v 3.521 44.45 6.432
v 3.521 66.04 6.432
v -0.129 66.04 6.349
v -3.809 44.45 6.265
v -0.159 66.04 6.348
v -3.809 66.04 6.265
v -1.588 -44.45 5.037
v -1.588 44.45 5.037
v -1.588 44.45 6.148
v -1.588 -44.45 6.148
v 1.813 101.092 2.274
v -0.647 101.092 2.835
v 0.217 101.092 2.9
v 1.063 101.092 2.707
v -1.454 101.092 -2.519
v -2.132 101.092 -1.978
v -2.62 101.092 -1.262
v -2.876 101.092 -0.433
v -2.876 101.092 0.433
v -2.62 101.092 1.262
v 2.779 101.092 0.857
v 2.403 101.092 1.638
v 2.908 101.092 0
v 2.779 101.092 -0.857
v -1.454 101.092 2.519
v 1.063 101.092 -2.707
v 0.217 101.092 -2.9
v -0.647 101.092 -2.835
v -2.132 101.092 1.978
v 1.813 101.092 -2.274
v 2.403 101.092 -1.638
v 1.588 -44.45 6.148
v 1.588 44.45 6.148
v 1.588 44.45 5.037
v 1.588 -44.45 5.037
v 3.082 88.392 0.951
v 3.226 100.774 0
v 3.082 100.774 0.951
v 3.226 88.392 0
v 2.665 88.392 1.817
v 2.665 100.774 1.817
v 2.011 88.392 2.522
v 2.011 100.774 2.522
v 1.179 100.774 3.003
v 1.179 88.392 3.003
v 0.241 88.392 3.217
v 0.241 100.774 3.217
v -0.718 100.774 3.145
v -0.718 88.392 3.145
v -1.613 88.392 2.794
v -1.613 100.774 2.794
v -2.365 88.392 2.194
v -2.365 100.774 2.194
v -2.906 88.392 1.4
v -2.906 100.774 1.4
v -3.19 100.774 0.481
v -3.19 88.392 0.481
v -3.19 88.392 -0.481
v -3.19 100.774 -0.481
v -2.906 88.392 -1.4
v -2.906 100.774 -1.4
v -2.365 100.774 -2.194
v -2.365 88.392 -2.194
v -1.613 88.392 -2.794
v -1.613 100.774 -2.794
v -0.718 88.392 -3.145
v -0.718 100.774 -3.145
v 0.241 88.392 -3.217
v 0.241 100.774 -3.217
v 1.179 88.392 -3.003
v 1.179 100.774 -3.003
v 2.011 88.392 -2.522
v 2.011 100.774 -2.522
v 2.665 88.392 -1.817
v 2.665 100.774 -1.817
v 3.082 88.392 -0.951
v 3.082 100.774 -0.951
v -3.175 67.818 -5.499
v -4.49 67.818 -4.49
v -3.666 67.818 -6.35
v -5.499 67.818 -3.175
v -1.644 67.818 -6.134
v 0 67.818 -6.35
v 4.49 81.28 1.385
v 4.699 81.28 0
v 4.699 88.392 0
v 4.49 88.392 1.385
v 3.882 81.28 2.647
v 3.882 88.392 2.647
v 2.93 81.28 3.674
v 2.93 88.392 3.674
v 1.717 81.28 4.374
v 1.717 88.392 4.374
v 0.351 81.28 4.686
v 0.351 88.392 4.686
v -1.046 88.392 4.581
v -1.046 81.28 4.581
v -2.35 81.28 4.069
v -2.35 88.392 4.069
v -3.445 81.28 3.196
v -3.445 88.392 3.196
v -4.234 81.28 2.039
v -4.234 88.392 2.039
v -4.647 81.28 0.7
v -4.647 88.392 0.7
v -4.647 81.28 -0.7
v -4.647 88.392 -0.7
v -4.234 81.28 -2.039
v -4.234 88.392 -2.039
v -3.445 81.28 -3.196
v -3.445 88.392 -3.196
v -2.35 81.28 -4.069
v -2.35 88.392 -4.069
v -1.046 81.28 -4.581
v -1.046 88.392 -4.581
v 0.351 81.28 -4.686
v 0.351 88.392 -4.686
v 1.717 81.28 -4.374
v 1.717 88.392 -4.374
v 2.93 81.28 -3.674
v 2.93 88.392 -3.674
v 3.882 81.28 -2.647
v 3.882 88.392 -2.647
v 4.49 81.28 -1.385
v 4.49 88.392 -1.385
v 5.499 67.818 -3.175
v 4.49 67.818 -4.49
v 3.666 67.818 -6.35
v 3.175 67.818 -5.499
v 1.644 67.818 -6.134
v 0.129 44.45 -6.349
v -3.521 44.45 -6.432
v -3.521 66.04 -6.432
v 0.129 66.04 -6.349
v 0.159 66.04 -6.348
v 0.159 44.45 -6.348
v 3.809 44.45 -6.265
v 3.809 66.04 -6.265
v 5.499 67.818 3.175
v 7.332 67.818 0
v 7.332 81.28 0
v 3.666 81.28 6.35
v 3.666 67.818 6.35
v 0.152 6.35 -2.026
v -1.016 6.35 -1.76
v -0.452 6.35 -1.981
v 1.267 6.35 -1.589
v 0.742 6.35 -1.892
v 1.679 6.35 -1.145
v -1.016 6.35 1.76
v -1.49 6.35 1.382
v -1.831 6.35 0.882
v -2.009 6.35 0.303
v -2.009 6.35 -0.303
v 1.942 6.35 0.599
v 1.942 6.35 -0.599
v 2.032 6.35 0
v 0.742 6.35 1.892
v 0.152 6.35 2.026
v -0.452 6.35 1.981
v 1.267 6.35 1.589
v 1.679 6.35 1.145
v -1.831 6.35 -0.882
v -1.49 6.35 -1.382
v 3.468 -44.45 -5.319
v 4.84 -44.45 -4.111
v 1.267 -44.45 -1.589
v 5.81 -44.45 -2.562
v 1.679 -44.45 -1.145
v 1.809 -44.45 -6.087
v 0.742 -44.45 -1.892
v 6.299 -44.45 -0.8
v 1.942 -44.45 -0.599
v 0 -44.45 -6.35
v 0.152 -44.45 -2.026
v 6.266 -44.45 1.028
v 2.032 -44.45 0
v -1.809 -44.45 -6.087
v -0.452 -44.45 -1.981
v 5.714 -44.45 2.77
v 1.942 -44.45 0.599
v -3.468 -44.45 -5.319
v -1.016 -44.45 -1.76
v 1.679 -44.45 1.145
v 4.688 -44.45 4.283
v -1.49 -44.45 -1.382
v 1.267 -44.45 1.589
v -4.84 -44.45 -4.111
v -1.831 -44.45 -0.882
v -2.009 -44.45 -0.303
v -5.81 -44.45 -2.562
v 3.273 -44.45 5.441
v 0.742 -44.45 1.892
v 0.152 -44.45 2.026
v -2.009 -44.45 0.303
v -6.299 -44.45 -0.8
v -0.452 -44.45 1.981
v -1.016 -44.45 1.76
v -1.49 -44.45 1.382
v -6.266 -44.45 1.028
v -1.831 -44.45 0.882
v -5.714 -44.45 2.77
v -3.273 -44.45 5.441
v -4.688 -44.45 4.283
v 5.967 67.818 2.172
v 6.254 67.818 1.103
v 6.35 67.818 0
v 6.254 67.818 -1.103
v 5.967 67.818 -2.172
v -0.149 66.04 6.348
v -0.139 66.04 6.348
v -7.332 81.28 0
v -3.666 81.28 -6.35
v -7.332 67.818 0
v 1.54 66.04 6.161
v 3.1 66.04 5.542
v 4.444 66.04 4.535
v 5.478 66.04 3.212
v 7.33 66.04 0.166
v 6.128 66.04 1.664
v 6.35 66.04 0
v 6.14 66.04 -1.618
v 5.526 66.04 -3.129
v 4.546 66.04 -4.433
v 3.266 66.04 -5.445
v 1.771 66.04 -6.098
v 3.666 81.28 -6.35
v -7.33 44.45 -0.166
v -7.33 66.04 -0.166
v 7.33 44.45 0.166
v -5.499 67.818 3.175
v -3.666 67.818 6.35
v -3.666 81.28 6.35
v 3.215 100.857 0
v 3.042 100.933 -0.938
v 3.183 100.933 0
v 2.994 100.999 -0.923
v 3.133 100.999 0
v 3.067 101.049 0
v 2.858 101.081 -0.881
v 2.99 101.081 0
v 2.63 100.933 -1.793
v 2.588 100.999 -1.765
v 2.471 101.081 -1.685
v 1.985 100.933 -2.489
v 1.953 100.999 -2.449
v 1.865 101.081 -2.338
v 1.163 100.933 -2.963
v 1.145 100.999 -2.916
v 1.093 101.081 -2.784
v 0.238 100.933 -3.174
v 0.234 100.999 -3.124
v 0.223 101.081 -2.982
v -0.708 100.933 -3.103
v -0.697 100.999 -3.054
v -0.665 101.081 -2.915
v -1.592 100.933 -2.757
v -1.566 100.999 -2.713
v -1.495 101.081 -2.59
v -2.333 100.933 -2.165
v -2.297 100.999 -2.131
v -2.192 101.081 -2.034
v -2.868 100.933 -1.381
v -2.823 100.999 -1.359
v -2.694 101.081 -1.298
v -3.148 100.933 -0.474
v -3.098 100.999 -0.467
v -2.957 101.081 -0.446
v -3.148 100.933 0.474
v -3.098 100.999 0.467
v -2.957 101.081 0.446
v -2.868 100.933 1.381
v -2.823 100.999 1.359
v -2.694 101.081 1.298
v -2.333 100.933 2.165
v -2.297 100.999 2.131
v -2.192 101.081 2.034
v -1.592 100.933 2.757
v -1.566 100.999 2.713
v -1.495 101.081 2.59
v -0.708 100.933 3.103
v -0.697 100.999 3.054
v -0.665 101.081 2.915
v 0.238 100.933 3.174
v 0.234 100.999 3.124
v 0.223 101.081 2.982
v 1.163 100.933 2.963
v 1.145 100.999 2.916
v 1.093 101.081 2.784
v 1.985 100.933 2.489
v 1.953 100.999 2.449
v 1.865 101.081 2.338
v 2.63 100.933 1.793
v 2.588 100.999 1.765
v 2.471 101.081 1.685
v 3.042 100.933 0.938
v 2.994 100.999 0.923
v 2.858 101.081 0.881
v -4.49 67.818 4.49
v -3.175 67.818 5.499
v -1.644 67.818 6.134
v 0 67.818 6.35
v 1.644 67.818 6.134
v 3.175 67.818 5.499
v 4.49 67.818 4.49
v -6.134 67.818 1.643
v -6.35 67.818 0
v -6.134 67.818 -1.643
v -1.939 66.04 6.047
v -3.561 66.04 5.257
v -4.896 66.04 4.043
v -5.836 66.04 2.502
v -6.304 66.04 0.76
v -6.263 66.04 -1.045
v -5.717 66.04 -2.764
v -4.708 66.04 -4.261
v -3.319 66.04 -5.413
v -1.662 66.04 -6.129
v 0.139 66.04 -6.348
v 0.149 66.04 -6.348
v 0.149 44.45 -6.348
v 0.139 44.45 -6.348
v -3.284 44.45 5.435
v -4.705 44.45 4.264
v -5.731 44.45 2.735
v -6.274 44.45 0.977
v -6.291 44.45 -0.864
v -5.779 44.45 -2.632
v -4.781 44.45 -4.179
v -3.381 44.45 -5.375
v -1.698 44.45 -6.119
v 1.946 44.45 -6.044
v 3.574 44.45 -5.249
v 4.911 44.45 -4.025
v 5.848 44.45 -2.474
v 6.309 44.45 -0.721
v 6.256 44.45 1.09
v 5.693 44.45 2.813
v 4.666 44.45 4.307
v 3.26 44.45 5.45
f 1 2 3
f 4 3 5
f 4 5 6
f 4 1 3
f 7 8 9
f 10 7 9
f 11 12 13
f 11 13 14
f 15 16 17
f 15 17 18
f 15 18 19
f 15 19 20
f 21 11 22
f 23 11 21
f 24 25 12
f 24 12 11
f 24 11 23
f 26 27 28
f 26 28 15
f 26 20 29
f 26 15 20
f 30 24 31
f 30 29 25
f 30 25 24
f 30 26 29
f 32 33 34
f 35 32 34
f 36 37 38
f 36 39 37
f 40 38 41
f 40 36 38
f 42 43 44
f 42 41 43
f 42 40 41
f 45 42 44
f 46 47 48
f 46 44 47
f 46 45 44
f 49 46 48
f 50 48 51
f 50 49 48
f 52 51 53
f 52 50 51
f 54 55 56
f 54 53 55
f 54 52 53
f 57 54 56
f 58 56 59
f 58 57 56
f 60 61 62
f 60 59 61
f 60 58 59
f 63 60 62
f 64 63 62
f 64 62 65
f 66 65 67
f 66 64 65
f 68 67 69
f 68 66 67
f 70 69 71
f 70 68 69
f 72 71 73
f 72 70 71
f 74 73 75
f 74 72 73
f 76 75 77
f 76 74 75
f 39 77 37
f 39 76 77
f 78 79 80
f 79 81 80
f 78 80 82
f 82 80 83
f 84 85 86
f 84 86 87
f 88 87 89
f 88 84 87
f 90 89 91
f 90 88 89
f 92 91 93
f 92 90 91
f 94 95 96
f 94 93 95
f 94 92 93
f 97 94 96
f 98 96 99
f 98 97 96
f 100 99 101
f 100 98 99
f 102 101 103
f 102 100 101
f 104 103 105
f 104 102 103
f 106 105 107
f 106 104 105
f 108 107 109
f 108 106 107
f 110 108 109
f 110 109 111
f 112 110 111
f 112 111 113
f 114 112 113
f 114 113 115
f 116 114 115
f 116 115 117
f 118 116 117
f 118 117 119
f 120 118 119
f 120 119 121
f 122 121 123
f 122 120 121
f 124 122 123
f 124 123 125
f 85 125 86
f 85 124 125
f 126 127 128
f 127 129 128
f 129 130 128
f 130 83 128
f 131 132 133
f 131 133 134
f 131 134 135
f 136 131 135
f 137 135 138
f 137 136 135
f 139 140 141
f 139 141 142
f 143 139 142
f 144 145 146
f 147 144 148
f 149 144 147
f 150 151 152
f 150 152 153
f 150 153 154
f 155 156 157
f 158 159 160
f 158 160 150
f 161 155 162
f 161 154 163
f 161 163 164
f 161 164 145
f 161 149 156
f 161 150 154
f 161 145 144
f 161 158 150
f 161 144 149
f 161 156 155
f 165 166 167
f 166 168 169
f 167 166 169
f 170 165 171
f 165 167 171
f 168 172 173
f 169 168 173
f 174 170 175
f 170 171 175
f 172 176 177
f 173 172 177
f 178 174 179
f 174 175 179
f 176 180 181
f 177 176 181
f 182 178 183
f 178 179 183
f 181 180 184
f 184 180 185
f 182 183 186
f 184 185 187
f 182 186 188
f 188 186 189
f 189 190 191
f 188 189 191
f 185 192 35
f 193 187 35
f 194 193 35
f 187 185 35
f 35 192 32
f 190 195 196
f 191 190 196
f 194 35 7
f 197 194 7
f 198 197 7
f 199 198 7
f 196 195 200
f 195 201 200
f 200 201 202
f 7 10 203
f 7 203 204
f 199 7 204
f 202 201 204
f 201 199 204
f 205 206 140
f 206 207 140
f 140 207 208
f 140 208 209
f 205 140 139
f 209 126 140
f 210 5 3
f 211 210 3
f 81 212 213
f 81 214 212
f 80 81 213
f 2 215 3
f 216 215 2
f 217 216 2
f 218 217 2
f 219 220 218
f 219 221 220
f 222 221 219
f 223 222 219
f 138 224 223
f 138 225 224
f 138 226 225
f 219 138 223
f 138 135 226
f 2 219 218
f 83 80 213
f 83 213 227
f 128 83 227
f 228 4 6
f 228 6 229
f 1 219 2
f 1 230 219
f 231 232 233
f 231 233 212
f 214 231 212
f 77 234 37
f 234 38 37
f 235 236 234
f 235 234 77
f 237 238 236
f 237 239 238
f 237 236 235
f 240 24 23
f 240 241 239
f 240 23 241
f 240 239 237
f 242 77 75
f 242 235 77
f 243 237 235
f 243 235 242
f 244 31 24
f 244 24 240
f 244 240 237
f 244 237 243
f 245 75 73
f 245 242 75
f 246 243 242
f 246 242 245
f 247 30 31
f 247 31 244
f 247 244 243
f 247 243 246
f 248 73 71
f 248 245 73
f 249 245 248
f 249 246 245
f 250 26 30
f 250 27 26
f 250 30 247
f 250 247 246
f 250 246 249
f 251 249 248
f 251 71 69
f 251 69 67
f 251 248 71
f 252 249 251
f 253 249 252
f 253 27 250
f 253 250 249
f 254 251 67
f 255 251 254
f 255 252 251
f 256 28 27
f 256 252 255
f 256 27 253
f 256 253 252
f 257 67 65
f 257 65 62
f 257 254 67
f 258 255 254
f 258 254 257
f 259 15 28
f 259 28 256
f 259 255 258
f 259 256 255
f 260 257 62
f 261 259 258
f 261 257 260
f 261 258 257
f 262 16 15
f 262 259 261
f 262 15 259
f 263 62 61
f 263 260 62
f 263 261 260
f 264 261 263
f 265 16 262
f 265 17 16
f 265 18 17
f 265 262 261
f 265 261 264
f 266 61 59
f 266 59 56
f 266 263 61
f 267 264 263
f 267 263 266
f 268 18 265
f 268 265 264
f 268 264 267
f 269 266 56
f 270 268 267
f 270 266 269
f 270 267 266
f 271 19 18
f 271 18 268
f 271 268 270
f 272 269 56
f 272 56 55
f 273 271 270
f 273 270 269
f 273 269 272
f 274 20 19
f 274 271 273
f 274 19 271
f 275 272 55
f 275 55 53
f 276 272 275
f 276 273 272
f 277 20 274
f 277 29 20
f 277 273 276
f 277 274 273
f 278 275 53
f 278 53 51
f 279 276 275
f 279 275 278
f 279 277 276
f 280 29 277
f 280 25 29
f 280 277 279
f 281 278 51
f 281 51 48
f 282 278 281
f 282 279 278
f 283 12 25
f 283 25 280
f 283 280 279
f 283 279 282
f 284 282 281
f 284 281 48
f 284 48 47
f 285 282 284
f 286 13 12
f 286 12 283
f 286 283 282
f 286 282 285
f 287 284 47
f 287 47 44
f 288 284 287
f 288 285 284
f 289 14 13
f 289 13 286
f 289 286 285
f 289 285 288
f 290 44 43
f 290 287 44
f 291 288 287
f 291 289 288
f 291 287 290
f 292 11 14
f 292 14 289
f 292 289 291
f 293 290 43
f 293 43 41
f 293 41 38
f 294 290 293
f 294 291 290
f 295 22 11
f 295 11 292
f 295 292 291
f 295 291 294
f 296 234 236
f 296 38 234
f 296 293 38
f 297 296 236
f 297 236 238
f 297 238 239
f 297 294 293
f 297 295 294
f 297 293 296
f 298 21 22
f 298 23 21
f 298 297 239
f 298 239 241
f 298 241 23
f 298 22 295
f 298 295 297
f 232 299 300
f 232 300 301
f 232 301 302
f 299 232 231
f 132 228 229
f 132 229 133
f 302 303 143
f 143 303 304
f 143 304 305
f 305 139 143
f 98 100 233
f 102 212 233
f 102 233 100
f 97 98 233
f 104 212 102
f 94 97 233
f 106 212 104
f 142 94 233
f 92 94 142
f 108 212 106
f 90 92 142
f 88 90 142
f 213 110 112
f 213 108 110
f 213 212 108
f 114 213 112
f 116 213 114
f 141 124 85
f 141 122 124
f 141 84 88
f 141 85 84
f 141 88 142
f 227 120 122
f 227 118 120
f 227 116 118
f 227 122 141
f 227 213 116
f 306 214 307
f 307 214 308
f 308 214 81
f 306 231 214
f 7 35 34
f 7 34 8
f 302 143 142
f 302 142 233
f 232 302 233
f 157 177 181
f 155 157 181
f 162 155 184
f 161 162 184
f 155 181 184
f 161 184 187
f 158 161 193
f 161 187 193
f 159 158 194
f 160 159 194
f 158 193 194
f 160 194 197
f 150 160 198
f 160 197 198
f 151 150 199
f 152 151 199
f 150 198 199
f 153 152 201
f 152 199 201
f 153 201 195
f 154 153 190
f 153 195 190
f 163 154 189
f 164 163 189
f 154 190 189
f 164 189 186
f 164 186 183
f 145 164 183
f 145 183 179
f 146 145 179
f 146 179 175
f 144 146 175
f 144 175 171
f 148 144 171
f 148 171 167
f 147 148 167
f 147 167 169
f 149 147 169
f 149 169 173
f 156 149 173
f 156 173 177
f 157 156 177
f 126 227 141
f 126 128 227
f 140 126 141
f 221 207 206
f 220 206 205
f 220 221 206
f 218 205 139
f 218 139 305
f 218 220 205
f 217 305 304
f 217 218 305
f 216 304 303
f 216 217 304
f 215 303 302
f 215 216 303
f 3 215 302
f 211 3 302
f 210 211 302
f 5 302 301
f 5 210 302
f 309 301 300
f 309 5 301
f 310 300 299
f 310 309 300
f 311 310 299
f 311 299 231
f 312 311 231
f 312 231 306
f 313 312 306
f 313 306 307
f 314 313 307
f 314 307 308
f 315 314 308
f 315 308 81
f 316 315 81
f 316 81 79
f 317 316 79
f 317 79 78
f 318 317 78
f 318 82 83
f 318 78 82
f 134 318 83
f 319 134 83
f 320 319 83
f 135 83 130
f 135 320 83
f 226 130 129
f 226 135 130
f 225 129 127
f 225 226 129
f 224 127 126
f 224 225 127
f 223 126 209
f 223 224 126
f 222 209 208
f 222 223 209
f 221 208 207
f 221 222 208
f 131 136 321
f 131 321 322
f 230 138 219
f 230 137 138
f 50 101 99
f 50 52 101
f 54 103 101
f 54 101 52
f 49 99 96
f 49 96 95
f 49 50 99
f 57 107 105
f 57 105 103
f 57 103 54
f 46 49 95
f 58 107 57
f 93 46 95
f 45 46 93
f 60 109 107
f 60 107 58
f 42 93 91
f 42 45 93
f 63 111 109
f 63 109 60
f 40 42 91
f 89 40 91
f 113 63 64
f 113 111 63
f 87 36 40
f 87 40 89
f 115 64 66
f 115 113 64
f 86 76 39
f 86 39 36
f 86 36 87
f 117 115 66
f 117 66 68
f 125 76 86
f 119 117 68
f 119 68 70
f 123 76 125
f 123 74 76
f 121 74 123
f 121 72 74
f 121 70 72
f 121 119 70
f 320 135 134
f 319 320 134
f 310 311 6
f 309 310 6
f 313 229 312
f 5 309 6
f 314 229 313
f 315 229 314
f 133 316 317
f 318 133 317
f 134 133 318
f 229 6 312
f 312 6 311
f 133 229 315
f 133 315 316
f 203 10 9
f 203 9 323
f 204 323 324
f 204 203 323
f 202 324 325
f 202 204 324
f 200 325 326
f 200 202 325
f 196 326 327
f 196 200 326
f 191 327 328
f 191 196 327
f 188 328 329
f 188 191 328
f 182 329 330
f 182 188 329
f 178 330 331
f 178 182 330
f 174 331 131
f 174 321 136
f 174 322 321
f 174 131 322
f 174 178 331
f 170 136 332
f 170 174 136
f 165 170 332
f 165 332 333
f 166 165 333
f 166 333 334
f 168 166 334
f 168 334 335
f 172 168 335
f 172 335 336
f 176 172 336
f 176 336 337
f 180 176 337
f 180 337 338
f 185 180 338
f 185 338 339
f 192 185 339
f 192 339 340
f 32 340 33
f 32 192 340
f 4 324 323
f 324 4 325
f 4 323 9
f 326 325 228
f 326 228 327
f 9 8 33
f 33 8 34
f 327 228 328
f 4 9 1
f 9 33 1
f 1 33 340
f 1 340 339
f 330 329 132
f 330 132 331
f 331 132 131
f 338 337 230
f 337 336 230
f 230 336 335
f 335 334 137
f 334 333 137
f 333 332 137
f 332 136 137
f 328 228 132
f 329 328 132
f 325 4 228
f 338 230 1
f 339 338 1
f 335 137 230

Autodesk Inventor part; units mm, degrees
ref_plane "YZ Plane" through (0, 0, 0) normal (1, 0, 0) x (0, 1, 0)
ref_plane "XZ Plane" through (0, 0, 0) normal (0, 1, 0) x (-1, 0, 0)
ref_plane "XY Plane" through (0, 0, 0) normal (0, 0, 1) x (1, 0, 0)
sketch "Sketch1" plane through (0, 0, 0) normal (0, 1, 0) x (-1, 0, 0)
  circle A0 centre (0, 0) radius 6.35
  dimension "d0" = 12.7
extrude "Extrusion1" add sketch "Sketch1" along normal mid plane 88.9
sketch "Sketch2" plane through (0, 44.45, 0) normal (0, 1, 0) x (1, 0, 0)
  circle A0 centre (0, 0) radius 6.35 projected
  line L0 (3.8092, 6.2652) -> (7.3305, -0.1662)
  line L1 (7.3305, -0.1662) -> (3.5213, -6.4315)
  line L2 (3.5213, -6.4315) -> (-3.8092, -6.2652)
  line L3 (-3.8092, -6.2652) -> (-7.3305, 0.1662)
  line L4 (-7.3305, 0.1662) -> (-3.5213, 6.4315)
  line L5 (-3.5213, 6.4315) -> (3.8092, 6.2652)
  dimension "d4" = 12.7
extrude "Extrusion2" add sketch "Sketch2" along normal blind 21.59
sketch "Sketch3" plane through (0, 66.04, 0) normal (0, 1, 0) x (1, 0, 0)
  circle A0 centre (0, 0) radius 6.35
  dimension "d7" = 12.7
extrude "Extrusion3" add sketch "Sketch3" along normal blind 1.778
sketch "Sketch4" plane through (0, 67.818, 0) normal (0, 1, 0) x (1, 0, 0)
  circle A0 centre (0, 0) radius 6.35 projected
  line L0 (7.3323, 0) -> (3.6662, -6.35)
  line L1 (3.6662, -6.35) -> (-3.6662, -6.35)
  line L2 (-3.6662, -6.35) -> (-7.3323, 0)
  line L3 (-7.3323, 0) -> (-3.6662, 6.35)
  line L4 (-3.6662, 6.35) -> (3.6662, 6.35)
  line L5 (3.6662, 6.35) -> (7.3323, 0)
  dimension "d10" = 12.7
extrude "Extrusion4" add sketch "Sketch4" along normal blind 13.462
sketch "Sketch5" plane through (0, 81.28, 0) normal (0, 1, 0) x (1, 0, 0)
  circle A0 centre (0, 0) radius 4.699
  dimension "d13" = 9.398
extrude "Extrusion5" add sketch "Sketch5" along normal blind 7.112
sketch "Sketch6" plane through (0, 88.392, 0) normal (0, 1, 0) x (1, 0, 0)
  circle A0 centre (0, 0) radius 4.699 projected
  circle A1 centre (0, 0) radius 3.2258
  dimension "d16" = 6.4516
extrude "Extrusion6" add sketch "Sketch6" along normal blind 12.7 contours A1
fillet "Fillet1" radius 0.3175 1 edges at (-3.2258, 101.092, 0)
sketch "Sketch7" plane through (0, -44.45, 0) normal (0, -1, 0) x (1, 0, 0)
  line L0 (-1.5875, 6.8356) -> (1.5875, 6.8356)
  line L1 (1.5875, 6.8356) -> (1.5875, 5.0371)
  line L2 (1.5875, 5.0371) -> (-1.5875, 5.0371)
  line L3 (-1.5875, 5.0371) -> (-1.5875, 6.8356)
  line L4 (0, 11.7561) -> (0, 9.7432)
  line L5 (-3.323, -0.0429) -> (4.4977, -0.0429)
  dimension "d20" = 3.175
  dimension "d24" = 5.08
extrude "Extrusion7" cut sketch "Sketch7" against normal blind 88.9
sketch "Sketch8" plane through (0, -44.45, 0) normal (0, -1, 0) x (1, 0, 0)
  arc A0 (-1.5875, 6.1484) -> (1.5875, 6.1484) centre (0, 0) ccw projected
  circle A1 centre (0, 0) radius 2.032
  dimension "d27" = 4.064
extrude "Extrusion8" cut sketch "Sketch8" against normal blind 50.8
properties part number "Shaft"
